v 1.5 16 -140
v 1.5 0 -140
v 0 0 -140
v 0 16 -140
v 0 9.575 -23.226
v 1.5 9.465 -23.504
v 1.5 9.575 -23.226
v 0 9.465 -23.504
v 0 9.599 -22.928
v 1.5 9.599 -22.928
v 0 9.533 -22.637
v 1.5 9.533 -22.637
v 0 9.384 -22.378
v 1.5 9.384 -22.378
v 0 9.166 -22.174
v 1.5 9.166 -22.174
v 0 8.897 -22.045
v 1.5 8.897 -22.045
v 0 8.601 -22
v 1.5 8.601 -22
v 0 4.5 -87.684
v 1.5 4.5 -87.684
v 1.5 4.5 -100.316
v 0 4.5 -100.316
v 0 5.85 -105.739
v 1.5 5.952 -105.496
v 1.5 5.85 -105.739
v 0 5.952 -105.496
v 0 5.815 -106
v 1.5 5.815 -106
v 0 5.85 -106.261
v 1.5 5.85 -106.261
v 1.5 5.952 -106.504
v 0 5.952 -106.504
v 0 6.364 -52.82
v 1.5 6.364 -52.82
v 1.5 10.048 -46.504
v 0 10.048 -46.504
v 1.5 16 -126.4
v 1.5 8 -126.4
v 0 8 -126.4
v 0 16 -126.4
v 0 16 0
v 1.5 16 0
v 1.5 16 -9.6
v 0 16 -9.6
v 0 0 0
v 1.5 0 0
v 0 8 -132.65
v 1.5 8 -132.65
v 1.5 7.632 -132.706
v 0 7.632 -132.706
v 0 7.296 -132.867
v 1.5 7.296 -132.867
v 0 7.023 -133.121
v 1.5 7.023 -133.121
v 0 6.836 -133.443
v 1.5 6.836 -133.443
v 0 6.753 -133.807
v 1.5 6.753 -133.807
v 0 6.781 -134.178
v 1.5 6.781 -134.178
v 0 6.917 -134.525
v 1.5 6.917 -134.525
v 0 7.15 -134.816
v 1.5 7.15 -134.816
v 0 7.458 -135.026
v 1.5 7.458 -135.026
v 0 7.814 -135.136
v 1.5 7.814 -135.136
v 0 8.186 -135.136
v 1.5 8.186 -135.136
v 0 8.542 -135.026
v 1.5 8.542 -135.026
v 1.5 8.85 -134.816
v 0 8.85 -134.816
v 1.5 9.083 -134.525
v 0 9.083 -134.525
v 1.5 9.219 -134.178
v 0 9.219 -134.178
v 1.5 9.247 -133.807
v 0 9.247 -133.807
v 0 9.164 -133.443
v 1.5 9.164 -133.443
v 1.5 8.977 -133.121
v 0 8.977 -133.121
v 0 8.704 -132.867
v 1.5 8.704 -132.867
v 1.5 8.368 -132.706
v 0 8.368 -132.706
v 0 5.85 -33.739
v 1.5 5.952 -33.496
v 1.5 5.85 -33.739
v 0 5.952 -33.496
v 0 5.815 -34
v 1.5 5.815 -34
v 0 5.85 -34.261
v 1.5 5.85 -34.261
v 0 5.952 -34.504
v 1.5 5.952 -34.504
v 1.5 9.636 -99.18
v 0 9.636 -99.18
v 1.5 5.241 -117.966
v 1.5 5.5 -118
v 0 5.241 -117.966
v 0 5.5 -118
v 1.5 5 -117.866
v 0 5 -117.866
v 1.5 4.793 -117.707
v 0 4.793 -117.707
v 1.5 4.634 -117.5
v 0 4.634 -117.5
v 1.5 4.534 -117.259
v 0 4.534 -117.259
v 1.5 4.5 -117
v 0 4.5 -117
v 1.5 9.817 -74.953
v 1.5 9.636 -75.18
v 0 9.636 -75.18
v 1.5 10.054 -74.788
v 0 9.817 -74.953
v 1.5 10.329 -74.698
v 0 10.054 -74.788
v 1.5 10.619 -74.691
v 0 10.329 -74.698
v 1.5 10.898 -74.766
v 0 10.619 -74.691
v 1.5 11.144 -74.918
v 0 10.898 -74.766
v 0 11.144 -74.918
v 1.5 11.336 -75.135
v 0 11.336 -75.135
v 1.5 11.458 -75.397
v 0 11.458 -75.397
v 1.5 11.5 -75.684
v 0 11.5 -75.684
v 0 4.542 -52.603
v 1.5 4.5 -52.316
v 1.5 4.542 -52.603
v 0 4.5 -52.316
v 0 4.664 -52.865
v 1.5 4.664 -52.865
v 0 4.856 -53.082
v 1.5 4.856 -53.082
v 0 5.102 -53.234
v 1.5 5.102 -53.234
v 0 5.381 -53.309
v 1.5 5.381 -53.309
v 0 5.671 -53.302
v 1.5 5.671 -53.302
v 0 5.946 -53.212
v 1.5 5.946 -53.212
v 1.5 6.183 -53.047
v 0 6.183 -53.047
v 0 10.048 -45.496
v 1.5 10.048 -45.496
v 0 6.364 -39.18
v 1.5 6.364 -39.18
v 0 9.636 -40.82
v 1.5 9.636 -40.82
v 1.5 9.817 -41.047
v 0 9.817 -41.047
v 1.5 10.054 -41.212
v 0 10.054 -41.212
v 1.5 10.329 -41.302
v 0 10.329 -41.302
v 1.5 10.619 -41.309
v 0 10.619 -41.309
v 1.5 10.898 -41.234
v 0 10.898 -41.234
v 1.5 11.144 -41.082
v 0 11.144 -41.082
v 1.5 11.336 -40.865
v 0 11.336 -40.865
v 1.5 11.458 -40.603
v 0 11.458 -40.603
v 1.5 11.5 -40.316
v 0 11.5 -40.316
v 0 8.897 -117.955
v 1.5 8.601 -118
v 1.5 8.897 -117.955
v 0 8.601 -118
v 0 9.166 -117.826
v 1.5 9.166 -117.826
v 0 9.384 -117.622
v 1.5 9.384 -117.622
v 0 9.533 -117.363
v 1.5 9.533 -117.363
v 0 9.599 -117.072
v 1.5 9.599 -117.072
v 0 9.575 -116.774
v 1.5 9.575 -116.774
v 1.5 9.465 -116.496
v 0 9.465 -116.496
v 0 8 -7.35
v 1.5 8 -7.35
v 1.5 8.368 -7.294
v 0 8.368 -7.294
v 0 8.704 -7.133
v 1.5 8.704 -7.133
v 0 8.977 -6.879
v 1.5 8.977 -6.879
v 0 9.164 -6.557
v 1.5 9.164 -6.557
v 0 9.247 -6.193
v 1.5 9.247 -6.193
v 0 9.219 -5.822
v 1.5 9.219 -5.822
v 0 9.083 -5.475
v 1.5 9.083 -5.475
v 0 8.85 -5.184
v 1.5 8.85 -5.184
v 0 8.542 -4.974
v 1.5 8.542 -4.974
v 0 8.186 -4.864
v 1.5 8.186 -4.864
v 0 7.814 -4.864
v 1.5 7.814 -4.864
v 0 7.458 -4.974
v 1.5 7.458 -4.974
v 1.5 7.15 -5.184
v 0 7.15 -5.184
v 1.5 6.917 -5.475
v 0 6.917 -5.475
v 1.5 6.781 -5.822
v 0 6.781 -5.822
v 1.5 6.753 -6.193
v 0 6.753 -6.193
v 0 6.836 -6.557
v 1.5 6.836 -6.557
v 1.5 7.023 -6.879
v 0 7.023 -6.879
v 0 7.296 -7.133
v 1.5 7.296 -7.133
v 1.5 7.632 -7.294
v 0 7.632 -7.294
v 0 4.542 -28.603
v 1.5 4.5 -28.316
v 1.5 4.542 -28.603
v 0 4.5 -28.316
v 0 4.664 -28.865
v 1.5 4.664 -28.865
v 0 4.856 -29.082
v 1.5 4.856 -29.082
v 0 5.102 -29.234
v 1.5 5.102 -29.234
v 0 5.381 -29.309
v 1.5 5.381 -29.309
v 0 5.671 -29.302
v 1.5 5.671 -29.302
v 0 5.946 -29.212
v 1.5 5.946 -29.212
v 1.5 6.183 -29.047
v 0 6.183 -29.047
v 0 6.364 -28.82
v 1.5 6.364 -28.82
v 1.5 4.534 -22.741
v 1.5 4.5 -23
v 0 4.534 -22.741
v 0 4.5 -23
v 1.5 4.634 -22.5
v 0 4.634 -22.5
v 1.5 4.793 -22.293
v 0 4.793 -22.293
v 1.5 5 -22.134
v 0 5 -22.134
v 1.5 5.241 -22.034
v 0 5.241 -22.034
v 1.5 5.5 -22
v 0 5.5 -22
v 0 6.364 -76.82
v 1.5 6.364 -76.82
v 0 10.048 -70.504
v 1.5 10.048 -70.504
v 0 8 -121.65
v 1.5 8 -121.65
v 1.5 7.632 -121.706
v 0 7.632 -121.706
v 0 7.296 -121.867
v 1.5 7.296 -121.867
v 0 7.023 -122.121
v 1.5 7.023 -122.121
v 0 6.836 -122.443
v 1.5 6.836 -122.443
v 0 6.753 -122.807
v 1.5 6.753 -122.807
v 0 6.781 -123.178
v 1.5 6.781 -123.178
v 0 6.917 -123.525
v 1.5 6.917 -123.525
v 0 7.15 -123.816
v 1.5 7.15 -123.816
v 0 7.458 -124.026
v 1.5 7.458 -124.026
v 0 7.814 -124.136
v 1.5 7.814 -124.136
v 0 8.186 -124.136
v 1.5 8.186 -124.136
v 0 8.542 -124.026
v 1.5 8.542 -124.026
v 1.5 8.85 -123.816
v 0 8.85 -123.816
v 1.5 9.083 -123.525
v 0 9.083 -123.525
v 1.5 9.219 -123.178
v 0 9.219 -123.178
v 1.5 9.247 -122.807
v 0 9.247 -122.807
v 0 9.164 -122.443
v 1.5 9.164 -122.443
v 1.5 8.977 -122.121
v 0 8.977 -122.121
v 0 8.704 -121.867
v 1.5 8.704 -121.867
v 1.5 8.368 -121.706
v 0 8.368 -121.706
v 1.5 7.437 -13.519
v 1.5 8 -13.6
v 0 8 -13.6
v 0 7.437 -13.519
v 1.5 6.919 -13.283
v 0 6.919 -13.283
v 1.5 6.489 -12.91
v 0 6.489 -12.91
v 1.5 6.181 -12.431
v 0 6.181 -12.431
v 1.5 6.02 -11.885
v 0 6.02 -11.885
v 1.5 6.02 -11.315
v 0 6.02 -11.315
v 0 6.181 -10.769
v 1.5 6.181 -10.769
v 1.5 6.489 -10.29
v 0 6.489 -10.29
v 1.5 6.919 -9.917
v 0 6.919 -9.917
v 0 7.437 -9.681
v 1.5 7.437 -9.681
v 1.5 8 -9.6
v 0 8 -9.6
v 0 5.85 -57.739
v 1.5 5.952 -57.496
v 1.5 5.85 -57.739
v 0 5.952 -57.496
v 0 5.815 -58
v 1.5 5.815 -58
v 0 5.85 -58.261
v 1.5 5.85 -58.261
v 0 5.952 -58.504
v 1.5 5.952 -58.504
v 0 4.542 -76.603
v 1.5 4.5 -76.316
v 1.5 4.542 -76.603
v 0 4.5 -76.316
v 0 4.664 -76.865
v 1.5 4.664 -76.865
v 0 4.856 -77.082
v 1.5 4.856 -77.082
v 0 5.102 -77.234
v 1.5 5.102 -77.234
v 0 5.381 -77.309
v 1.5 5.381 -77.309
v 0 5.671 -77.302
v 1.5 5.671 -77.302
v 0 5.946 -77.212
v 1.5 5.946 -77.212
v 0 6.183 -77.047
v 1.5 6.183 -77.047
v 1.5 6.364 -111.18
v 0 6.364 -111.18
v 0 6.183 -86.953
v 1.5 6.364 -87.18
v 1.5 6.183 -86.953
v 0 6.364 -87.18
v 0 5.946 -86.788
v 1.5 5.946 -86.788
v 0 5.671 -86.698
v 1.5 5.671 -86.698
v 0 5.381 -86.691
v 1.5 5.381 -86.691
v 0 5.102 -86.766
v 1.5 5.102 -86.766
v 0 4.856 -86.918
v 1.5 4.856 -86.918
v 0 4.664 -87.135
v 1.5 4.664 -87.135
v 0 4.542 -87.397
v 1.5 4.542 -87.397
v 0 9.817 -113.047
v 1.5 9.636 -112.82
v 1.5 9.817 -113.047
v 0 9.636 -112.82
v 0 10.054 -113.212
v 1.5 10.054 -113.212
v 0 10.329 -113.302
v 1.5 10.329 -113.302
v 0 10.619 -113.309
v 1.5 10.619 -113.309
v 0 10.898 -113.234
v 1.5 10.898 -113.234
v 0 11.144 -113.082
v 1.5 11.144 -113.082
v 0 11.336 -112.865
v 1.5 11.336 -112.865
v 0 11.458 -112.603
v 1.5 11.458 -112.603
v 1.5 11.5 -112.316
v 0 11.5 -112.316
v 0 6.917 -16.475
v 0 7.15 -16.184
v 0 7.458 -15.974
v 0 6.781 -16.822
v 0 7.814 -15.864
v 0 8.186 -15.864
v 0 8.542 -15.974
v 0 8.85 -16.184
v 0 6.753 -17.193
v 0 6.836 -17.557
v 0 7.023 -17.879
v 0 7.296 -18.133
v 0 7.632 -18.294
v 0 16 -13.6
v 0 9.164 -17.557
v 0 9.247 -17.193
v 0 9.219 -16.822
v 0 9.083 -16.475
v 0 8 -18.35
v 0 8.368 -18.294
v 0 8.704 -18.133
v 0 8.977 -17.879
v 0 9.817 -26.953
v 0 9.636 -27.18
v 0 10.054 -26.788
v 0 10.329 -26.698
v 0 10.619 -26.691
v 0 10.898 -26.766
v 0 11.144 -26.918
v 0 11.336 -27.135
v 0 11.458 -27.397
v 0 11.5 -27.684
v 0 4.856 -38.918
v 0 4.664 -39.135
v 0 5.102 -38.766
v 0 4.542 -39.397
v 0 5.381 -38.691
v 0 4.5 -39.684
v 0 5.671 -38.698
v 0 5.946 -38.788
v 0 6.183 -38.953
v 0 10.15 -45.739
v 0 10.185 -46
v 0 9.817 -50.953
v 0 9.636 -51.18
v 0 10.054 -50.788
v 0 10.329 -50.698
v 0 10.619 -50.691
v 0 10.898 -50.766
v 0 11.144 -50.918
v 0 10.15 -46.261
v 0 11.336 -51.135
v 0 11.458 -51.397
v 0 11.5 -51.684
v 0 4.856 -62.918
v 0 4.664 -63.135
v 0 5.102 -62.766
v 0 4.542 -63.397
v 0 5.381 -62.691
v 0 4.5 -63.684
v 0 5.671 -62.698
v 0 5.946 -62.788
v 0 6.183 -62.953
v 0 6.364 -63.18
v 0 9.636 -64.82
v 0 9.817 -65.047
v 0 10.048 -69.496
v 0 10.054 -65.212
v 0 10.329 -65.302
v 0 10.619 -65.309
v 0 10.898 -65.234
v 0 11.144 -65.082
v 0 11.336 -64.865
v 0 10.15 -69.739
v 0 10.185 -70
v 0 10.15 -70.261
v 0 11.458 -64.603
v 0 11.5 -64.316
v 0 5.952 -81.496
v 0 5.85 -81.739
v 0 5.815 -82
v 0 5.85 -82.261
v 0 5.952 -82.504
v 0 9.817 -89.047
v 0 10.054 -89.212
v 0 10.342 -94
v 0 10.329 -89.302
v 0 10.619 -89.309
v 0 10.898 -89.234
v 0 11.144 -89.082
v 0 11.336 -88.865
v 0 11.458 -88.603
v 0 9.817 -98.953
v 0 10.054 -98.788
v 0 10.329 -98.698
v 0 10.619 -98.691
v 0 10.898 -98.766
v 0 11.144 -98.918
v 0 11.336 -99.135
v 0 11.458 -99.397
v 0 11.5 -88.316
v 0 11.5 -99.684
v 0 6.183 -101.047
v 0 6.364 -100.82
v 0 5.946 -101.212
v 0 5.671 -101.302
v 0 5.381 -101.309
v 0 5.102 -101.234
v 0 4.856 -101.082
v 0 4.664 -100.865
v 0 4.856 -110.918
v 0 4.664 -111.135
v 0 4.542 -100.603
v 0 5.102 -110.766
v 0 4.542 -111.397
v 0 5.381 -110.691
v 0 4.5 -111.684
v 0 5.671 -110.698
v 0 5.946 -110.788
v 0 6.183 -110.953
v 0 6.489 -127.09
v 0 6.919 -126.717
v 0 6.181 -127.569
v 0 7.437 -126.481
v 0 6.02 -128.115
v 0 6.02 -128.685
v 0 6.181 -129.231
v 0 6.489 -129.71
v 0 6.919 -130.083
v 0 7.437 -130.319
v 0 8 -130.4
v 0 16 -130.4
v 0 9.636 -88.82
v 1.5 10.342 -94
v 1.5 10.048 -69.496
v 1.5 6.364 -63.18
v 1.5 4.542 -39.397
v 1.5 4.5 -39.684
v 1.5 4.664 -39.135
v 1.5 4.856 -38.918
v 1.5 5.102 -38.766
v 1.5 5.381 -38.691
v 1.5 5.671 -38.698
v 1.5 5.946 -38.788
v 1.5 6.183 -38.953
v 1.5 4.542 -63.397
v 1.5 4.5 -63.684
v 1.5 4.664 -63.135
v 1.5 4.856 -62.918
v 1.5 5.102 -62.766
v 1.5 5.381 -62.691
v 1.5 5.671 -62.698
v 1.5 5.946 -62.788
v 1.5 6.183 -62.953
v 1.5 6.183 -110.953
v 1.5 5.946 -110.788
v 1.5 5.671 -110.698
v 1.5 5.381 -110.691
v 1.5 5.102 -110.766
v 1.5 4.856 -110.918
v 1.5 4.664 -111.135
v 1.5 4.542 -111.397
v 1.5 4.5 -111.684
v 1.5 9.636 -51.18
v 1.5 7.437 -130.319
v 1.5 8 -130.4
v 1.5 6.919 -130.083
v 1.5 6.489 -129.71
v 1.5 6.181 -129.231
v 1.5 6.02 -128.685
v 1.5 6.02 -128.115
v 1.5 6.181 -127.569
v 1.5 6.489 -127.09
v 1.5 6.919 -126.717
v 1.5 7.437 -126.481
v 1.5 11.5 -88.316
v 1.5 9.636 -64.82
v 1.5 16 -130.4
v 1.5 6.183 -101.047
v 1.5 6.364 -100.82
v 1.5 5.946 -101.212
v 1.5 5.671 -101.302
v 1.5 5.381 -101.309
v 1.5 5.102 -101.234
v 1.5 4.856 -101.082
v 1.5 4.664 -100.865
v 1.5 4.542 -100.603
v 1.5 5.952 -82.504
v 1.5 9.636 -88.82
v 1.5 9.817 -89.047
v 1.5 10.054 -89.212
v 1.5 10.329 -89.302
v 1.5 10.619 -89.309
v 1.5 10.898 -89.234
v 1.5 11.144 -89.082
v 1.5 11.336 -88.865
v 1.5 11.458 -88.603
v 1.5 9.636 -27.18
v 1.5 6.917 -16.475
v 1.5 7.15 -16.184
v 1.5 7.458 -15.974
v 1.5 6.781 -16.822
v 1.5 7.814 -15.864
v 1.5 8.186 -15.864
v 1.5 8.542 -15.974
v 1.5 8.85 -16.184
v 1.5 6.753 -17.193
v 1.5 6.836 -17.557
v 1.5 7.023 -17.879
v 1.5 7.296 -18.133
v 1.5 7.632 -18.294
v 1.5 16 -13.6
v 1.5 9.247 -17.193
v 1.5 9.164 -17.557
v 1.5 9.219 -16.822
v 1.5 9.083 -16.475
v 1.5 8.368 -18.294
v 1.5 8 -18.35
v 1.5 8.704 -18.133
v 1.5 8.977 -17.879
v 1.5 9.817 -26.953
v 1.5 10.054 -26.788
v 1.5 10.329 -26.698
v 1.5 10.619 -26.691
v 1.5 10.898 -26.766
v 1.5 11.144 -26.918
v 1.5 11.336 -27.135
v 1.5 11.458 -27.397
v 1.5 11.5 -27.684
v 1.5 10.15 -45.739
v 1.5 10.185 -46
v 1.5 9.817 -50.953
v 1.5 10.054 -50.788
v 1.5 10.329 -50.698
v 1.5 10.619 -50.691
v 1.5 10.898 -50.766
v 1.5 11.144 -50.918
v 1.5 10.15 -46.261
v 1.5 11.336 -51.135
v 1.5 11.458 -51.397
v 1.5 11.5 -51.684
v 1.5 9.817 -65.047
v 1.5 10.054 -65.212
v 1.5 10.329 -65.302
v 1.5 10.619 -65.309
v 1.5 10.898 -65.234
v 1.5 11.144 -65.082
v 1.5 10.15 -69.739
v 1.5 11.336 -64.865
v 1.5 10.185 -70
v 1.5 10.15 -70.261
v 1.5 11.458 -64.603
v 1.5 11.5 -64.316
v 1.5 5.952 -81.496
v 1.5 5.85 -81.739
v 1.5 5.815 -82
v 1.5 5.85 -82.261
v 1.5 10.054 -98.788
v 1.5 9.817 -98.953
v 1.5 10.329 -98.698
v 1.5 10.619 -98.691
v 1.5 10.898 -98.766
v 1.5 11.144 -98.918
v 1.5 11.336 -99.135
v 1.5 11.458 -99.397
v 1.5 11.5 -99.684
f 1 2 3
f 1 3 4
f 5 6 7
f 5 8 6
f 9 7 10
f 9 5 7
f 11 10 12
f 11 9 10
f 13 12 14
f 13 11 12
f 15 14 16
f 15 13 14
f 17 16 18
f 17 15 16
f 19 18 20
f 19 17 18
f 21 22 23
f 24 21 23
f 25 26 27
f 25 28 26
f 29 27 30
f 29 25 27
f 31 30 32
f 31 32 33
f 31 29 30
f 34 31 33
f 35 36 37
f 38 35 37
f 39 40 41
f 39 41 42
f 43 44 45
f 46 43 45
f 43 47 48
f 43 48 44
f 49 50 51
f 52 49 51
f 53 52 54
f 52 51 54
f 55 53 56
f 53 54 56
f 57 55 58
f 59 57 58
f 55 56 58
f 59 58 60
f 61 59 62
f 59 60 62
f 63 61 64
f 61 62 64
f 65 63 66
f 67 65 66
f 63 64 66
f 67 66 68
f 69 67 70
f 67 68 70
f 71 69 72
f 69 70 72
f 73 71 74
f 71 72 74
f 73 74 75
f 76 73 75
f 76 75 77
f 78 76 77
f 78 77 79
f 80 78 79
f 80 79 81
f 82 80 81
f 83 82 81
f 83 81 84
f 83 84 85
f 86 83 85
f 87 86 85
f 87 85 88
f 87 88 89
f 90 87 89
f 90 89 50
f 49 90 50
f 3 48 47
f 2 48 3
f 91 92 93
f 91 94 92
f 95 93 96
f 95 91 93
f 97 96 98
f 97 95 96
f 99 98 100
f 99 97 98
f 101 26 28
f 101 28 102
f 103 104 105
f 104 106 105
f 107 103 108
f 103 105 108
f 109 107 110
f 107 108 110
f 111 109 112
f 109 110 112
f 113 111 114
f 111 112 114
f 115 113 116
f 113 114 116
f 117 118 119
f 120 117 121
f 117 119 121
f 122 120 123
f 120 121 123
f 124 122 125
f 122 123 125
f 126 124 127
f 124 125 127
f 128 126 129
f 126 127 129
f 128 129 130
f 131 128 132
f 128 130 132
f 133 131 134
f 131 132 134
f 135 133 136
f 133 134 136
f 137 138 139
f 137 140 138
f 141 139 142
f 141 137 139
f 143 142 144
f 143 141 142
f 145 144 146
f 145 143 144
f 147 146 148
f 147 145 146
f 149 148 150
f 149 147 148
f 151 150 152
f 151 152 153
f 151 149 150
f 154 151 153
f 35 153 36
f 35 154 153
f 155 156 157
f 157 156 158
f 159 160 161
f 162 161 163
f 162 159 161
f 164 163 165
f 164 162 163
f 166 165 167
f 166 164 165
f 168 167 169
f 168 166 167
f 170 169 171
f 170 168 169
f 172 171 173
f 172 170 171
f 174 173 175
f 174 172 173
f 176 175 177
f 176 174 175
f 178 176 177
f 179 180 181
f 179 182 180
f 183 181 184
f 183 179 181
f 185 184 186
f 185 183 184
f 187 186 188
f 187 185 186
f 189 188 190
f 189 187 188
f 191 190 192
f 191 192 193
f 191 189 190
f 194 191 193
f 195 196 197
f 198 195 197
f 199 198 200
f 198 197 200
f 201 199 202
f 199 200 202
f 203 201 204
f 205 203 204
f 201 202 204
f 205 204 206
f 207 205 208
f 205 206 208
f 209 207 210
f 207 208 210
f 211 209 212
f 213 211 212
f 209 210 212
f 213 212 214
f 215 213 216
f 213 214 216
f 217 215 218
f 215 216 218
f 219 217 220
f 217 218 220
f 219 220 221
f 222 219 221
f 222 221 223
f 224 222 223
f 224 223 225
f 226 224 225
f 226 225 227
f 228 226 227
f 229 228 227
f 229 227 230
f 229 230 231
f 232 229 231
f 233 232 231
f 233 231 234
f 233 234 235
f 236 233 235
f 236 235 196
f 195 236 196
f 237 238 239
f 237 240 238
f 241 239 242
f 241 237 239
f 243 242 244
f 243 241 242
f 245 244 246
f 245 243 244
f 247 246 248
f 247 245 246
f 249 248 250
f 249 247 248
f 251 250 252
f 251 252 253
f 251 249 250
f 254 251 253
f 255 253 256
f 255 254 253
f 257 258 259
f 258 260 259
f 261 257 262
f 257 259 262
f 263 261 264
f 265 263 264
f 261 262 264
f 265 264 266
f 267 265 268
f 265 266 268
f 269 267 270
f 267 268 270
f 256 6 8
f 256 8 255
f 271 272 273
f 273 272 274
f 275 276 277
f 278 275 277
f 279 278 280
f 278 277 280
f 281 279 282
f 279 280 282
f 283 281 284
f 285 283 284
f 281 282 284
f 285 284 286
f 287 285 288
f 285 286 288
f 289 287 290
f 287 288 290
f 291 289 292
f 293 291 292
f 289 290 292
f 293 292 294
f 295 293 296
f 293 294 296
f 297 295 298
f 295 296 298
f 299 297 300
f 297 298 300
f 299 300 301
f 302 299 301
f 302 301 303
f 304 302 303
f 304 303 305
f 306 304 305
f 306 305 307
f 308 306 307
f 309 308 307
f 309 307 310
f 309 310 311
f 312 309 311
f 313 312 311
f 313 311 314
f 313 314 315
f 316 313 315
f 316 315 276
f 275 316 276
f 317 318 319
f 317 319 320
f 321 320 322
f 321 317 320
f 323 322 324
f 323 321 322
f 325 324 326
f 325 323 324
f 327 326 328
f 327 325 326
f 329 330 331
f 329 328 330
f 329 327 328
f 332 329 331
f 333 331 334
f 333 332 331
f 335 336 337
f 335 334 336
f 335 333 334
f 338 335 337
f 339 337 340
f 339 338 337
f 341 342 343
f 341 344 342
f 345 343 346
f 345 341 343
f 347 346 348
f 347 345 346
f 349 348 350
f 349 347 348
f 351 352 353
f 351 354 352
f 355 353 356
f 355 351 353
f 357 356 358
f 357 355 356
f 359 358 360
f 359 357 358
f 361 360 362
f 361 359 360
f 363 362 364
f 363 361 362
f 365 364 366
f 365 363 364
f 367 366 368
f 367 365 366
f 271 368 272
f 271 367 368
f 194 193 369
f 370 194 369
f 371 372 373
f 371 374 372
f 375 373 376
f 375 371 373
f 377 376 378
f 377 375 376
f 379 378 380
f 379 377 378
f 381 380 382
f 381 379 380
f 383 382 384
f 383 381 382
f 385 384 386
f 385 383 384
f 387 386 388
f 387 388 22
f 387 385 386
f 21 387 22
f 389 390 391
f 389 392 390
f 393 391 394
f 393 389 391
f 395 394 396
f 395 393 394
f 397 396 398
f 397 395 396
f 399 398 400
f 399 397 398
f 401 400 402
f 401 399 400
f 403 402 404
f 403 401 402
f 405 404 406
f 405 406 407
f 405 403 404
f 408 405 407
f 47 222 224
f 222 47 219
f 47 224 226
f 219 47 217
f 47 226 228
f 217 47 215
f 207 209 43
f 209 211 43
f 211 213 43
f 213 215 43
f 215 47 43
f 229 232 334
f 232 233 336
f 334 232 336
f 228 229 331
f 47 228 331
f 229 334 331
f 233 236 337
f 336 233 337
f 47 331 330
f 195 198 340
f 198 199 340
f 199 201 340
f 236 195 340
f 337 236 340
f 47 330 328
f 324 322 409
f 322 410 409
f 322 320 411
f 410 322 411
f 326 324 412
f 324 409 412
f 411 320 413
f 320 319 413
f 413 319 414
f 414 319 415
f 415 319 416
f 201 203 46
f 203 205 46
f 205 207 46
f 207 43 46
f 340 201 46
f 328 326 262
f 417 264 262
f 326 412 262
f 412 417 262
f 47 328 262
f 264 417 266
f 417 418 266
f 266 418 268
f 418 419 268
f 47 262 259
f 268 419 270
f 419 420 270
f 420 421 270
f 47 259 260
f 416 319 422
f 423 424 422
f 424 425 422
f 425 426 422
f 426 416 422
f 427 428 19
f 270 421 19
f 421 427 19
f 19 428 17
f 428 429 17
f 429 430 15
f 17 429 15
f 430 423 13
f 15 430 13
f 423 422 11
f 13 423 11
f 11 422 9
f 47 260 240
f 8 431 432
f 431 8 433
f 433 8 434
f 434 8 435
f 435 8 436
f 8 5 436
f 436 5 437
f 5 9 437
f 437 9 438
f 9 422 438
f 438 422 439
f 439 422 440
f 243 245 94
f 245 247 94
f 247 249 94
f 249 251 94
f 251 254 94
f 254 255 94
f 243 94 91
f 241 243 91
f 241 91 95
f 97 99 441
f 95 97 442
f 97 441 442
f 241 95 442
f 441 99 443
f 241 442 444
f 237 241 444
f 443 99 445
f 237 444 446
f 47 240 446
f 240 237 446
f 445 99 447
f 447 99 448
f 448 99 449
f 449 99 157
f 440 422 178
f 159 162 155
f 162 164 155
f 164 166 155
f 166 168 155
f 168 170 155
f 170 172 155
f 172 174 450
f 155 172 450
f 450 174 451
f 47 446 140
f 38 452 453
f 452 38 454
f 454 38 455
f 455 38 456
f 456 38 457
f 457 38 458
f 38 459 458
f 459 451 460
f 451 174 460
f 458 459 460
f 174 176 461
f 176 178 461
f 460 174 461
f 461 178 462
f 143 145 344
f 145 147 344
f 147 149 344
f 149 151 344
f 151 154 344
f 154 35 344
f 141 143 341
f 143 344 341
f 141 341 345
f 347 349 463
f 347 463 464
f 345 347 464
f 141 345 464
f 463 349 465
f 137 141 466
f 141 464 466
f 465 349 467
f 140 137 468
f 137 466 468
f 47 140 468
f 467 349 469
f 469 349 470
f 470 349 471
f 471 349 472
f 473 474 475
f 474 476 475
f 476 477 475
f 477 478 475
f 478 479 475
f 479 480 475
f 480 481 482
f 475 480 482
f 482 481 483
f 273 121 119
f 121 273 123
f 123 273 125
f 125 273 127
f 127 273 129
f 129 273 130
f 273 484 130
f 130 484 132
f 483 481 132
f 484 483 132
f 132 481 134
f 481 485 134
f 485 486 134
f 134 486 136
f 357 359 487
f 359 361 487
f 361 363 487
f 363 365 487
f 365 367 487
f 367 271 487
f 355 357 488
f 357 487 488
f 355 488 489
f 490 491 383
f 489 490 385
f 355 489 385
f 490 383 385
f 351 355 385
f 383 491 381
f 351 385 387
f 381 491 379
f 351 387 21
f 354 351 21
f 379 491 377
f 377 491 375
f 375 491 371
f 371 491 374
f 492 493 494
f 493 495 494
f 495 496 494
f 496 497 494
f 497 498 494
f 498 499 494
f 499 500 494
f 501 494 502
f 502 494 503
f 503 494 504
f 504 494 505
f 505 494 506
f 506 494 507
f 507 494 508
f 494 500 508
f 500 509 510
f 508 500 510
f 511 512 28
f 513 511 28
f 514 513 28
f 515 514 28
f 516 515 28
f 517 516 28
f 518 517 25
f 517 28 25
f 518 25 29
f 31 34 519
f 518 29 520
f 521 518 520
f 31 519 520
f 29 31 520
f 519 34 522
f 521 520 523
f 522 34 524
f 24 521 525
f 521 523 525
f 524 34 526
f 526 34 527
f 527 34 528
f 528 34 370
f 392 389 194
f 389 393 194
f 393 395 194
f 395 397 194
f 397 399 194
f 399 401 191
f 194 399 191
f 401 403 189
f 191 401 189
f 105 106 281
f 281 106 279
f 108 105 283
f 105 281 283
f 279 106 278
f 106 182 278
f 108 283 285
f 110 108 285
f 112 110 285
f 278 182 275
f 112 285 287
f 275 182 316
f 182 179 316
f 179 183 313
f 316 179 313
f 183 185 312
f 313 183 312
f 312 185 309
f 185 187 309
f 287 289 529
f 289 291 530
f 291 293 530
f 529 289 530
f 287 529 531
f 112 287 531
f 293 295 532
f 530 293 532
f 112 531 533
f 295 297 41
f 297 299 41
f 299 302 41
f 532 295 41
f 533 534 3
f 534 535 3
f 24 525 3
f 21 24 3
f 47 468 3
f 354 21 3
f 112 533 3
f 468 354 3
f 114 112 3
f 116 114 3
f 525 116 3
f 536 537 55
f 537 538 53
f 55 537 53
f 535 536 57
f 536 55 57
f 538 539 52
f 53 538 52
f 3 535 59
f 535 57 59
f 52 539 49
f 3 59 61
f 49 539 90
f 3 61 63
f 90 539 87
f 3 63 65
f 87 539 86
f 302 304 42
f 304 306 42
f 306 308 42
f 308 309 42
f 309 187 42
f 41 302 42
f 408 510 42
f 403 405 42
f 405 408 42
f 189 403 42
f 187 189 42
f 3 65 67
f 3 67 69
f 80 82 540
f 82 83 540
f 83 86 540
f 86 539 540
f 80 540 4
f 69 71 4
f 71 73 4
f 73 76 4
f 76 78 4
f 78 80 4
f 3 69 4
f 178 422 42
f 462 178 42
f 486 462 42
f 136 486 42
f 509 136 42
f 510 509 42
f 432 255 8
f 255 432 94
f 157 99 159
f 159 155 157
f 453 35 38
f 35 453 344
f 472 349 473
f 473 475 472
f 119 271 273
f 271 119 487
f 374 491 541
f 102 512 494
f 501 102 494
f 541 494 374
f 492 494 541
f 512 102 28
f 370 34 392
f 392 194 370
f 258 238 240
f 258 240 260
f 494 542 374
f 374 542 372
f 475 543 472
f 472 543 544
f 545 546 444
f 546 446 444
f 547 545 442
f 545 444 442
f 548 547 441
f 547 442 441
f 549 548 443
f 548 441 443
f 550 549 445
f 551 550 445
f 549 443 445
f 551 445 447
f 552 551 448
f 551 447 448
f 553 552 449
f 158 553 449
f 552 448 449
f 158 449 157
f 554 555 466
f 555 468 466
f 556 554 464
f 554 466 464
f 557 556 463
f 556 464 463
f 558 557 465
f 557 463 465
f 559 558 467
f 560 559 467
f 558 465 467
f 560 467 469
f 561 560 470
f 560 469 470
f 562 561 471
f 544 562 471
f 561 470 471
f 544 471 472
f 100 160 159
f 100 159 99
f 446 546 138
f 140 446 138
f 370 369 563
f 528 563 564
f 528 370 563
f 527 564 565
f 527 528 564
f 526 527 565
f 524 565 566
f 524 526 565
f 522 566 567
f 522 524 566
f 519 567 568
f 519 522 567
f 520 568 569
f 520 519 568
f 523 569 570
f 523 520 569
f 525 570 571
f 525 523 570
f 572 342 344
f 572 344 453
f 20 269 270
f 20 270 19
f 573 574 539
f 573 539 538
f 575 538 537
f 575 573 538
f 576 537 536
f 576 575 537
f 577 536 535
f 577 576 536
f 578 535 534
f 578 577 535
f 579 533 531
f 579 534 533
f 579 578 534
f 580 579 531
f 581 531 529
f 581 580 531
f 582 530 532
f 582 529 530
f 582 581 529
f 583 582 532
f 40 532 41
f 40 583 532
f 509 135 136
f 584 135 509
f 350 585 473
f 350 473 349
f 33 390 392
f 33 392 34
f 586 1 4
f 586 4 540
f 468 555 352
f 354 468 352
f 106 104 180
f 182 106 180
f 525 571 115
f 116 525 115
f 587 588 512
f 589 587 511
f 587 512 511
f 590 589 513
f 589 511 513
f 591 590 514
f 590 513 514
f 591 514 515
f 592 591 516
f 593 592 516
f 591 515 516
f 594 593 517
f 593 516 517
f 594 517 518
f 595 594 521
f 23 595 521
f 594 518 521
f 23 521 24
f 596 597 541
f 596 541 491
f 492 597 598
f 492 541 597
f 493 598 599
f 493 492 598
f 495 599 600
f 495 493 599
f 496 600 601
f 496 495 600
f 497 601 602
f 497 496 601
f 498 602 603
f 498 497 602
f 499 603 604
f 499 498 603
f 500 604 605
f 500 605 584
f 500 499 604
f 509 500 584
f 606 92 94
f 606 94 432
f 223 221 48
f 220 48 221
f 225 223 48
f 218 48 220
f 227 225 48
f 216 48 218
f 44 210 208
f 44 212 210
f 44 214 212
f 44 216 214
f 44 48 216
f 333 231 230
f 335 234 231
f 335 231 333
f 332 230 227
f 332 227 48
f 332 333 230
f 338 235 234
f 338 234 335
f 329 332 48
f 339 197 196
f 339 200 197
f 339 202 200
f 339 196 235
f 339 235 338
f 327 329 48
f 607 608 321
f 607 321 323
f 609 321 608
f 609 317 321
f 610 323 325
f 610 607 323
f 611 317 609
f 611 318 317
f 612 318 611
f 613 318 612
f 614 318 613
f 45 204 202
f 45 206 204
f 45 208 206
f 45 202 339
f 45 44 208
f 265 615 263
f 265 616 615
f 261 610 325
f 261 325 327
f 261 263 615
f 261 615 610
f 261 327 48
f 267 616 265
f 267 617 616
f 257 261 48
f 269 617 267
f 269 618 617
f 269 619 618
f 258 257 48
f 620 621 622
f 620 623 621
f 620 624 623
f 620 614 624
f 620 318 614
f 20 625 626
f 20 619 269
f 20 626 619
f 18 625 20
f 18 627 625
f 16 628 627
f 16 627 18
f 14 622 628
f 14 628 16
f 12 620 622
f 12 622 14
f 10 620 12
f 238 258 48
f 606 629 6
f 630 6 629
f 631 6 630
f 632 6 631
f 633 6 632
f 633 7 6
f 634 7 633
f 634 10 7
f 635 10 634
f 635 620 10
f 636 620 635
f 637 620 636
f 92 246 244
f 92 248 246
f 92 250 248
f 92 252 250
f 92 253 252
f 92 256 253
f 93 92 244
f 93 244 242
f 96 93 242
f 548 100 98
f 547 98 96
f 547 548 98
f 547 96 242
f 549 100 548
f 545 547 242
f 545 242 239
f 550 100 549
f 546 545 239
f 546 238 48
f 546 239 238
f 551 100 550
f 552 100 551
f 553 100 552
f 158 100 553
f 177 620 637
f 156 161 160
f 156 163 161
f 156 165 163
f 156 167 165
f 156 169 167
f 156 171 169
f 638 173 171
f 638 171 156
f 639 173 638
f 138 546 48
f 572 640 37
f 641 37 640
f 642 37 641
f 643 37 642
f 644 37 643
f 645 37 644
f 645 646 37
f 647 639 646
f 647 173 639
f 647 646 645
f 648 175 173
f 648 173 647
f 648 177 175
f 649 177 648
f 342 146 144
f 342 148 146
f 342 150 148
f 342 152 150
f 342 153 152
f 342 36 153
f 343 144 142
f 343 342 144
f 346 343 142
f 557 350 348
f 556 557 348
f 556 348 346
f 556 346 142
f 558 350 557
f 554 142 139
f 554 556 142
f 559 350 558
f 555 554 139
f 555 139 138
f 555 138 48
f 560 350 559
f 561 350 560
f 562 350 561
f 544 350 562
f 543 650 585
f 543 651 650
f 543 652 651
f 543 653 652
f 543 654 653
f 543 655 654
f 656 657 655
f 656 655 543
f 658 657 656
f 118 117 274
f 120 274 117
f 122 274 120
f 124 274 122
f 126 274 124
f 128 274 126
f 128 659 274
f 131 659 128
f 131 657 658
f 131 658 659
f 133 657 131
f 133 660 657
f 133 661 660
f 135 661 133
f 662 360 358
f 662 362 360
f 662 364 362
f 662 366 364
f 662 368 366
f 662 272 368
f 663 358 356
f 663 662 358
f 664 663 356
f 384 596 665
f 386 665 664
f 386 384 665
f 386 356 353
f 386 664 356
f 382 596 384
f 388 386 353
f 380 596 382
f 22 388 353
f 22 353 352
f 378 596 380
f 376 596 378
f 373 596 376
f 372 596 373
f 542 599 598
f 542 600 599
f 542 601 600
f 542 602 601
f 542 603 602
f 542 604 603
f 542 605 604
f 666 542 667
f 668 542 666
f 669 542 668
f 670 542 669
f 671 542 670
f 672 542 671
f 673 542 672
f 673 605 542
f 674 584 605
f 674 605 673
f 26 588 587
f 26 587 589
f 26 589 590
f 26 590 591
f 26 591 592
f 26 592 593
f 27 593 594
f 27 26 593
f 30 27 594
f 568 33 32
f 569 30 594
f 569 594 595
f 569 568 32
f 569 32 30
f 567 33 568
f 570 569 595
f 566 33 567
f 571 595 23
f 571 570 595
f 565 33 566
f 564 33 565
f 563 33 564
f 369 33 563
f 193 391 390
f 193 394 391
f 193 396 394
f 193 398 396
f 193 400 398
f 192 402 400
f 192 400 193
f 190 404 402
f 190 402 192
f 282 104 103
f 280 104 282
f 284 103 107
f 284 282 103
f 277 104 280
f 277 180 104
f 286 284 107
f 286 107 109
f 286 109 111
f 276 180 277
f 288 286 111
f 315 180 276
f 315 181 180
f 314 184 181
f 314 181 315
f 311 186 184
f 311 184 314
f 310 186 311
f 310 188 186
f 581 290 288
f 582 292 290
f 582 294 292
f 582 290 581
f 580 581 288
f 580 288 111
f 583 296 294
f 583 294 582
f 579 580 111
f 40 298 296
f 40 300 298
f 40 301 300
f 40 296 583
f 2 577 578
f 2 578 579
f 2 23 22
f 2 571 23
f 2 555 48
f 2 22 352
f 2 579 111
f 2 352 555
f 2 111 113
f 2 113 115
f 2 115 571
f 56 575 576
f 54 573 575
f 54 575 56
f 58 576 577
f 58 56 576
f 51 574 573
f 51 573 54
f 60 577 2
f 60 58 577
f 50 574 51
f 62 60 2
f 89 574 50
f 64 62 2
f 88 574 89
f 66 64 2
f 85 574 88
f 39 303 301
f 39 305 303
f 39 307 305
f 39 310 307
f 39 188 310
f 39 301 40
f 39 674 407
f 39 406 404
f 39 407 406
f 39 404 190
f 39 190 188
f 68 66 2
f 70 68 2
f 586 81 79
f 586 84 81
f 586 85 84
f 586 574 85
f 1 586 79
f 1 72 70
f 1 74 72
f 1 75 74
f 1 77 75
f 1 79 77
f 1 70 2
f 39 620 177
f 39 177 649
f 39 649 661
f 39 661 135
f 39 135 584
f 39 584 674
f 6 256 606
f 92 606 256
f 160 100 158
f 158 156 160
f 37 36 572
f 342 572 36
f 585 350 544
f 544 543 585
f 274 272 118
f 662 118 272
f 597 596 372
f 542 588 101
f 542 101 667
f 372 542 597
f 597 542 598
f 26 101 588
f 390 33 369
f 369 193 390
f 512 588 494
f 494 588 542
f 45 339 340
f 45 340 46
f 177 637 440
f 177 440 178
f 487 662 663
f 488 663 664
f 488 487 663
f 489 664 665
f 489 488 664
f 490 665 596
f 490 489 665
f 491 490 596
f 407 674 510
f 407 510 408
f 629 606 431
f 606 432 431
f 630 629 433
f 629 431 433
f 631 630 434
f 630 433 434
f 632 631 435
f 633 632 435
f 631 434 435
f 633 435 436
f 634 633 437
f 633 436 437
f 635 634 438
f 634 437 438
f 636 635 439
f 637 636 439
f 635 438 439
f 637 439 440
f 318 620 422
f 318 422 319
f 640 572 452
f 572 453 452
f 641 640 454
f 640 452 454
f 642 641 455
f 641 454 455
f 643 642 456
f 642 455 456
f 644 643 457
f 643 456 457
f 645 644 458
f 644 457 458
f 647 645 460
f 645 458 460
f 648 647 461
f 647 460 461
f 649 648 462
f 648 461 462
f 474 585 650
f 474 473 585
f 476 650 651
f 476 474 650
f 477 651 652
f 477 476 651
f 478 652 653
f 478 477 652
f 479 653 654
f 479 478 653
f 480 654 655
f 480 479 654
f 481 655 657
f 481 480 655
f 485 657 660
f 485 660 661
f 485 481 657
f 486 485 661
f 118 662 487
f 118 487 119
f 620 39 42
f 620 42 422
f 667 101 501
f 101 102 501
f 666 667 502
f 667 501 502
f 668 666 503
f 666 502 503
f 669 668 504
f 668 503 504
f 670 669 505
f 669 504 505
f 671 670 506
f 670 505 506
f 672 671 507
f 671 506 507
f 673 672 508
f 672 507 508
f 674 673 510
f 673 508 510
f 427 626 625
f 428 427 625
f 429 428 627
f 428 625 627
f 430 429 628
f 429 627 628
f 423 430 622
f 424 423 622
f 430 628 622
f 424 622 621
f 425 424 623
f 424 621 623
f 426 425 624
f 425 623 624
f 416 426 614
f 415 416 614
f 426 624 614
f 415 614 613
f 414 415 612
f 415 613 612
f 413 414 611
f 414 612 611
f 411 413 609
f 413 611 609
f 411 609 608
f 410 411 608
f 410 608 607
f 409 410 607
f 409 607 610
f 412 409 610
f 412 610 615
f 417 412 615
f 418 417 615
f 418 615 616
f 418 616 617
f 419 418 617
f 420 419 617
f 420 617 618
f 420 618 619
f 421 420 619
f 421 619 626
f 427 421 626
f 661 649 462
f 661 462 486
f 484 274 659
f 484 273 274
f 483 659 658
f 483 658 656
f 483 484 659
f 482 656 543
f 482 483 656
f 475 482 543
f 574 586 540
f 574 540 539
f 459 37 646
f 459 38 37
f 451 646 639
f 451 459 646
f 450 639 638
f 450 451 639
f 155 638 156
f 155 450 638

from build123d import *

# Parameters (mm, degrees)
SKETCH1_R           = 1.05
BOSS_EXTRUDE1_DEPTH = 1.5
FILLET1_R           = 1.5
SKETCH2_R           = 1.05
SKETCH2_W           = 4
SKETCH2_H           = 16
BOSS_EXTRUDE2_DEPTH = 1.5
SKETCH4_R           = 1.25
CUT_EXTRUDE2_DEPTH  = 160.067595694
CUT_EXTRUDE4_DEPTH  = 160.067595694
FILLET3_R           = 1
FILLET4_R           = 1.5
SKETCH6_W           = 140
SKETCH6_H           = 59.5
CUT_EXTRUDE5_DEPTH  = 10


with BuildPart() as part:
    # Sketch1 → Boss-Extrude1 (new body)
    with BuildSketch(Plane(origin=(0, 0, 0), x_dir=(0, 0, -1), z_dir=(1, 0, 0))):
        Polygon((0, 0), (0, 75.5), (21.5, 75.5), (40, 0), (35.881667859, 0), (29.755840045, 25), (4, 25), (4, 0), align=None)
        with Locations((5.5, 72.5)):
            Circle(SKETCH1_R, mode=Mode.SUBTRACT)
        with Locations((18.5, 72.5)):
            Circle(SKETCH1_R, mode=Mode.SUBTRACT)
        Polygon((4, 69.5), (18.851866535, 69.5), (4, 29), align=None, mode=Mode.SUBTRACT)
        Polygon((8.260475549, 29), (20.558388216, 62.535546651), (28.775707595, 29), align=None, mode=Mode.SUBTRACT)
    extrude(amount=BOSS_EXTRUDE1_DEPTH)

    # Fillet1
    fillet1_edges = [part.edges().sort_by_distance(p)[0] for p in [
        (0.75, 75.5, -21.5),
        (0.75, 25, -29.755840045),
        (0.75, 25, -4),
        (0.75, 69.5, -4),
        (0.75, 29, -4),
        (0.75, 69.5, -18.851866535),
        (0.75, 29, -8.260475549),
        (0.75, 29, -28.775707595),
        (0.75, 62.535546651, -20.558388216),
    ]]
    fillet(fillet1_edges, radius=FILLET1_R)

    # Sketch2 → Boss-Extrude2 (add)
    # profile 1 of 5: a face of its own
    with BuildSketch(Plane(origin=(1.5, 0, 0), x_dir=(0, 0, -1), z_dir=(1, 0, 0))):
        Polygon((70, 0), (70, 16), (36.079470199, 16), (40, 0), align=None)
    # profile 2 of 5: a face of its own
    with BuildSketch(Plane(origin=(1.5, 0, 0), x_dir=(0, 0, -1), z_dir=(1, 0, 0))):
        with BuildLine():
            Line((103.920529801, 16), (70, 16))
            Line((70, 16), (70, 0))
            Line((70, 0), (140, 0))
            Line((140, 0), (140, 16))
            Line((140, 16), (140, 75.5))
            Line((140, 75.5), (119.676824884, 75.5))
            ThreePointArc((119.676824884, 75.5), (118.750942408, 75.180144754), (118.219924421, 74.356988855))
            Line((118.219924421, 74.356988855), (103.920529801, 16))
        make_face()
        with BuildLine():
            Line((108.038861942, 16), (109.964084377, 23.856988855))
            ThreePointArc((109.964084377, 23.856988855), (110.495102363, 24.680144754), (111.420984839, 25))
            Line((111.420984839, 25), (134.5, 25))
            ThreePointArc((134.5, 25), (135.560660172, 24.560660172), (136, 23.5))
            Line((136, 23.5), (136, 16))
            Line((136, 16), (108.038861942, 16))
        make_face(mode=Mode.SUBTRACT)
        with BuildLine():
            ThreePointArc((131.000070484, 31.016439186), (130.821545012, 29.641122471), (129.591776989, 29))
            Line((129.591776989, 29), (113.136216627, 29))
            ThreePointArc((113.136216627, 29), (111.956071873, 29.574117524), (111.679316165, 30.856988855))
            Line((111.679316165, 30.856988855), (118.270545293, 57.756329353))
            ThreePointArc((118.270545293, 57.756329353), (119.644098522, 58.897023121), (121.135739251, 57.915779684))
            Line((121.135739251, 57.915779684), (131.000070484, 31.016439186))
        make_face(mode=Mode.SUBTRACT)
        with BuildLine():
            ThreePointArc((121.887587432, 67.483560814), (122.066112904, 68.858877529), (123.295880927, 69.5))
            Line((123.295880927, 69.5), (134.5, 69.5))
            ThreePointArc((134.5, 69.5), (135.560660172, 69.060660172), (136, 68))
            Line((136, 68), (136, 37.447151885))
            ThreePointArc((136, 37.447151885), (134.762259183, 35.970256452), (133.091706505, 36.930712699))
            Line((133.091706505, 36.930712699), (121.887587432, 67.483560814))
        make_face(mode=Mode.SUBTRACT)
        with Locations((121.5, 72.5)):
            Circle(SKETCH2_R, mode=Mode.SUBTRACT)
        with Locations((134.5, 72.5)):
            Circle(SKETCH2_R, mode=Mode.SUBTRACT)
    # profile 3 of 5: a face of its own
    with BuildSketch(Plane(origin=(1.5, 0, 0), x_dir=(0, 0, -1), z_dir=(1, 0, 0))):
        Polygon((35.881667859, 0), (31.961138058, 16), (4, 16), (4, 0), align=None)
    # profile 4 of 5: a face of its own
    with BuildSketch(Plane(origin=(1.5, 0, 0), x_dir=(0, 0, -1), z_dir=(1, 0, 0))):
        Polygon((40, 0), (36.079470199, 16), (31.961138058, 16), (35.881667859, 0), align=None)
    # profile 5 of 5: a face of its own
    with BuildSketch(Plane(origin=(1.5, 0, 0), x_dir=(0, 0, -1), z_dir=(1, 0, 0))):
        with Locations((2, 8)):
            Rectangle(SKETCH2_W, SKETCH2_H)
    extrude(amount=-BOSS_EXTRUDE2_DEPTH)

    # Sketch4 → Cut-Extrude2 (cut, through all)
    with BuildSketch(Plane(origin=(1.5, 0, 0), x_dir=(0, 0, -1), z_dir=(1, 0, 0))):
        with Locations((6.1, 8)):
            Circle(SKETCH4_R)
        with Locations((17.1, 8)):
            Circle(SKETCH4_R)
        with Locations(Location((122.9, 8, 0), (0, 0, 180))):
            Circle(SKETCH4_R)
        with Locations(Location((133.9, 8, 0), (0, 0, 180))):
            Circle(SKETCH4_R)
        with BuildLine():
            Line((126.4, 16), (130.4, 16))
            Line((130.4, 16), (130.4, 8))
            ThreePointArc((130.4, 8), (128.4, 6), (126.4, 8))
            Line((126.4, 8), (126.4, 16))
        make_face()
        with BuildLine():
            Line((9.6, 16), (13.6, 16))
            Line((13.6, 16), (13.6, 8))
            ThreePointArc((13.6, 8), (11.6, 6), (9.6, 8))
            Line((9.6, 8), (9.6, 16))
        make_face()
    extrude(amount=-CUT_EXTRUDE2_DEPTH, mode=Mode.SUBTRACT)

    # Sketch5 → Cut-Extrude4 (cut, through all)
    with BuildSketch(Plane(origin=(1.5, 0, 0), x_dir=(0, 0, -1), z_dir=(1, 0, 0))):
        Polygon((35.984634856, 4.5), (46, 4.5), (56.015365144, 4.5), (46, 10.342296334), align=None)
        Polygon((47.984634856, 11.5), (68.015365144, 11.5), (58, 5.657703666), align=None)
        Polygon((59.984634856, 4.5), (70, 4.5), (80.015365144, 4.5), (70, 10.342296334), align=None)
        Polygon((22, 4.5), (22, 10.342296334), (32.015365144, 4.5), align=None)
        Polygon((23.984634856, 11.5), (44.015365144, 11.5), (34, 5.657703666), align=None)
        Polygon((118, 4.5), (118, 10.342296334), (107.984634856, 4.5), align=None)
        Polygon((94, 4.5), (104.015365144, 4.5), (94, 10.342296334), (83.984634856, 4.5), align=None)
        Polygon((95.984634856, 11.5), (116.015365144, 11.5), (106, 5.657703666), align=None)
        Polygon((71.984634856, 11.5), (92.015365144, 11.5), (82, 5.657703666), align=None)
    extrude(amount=-CUT_EXTRUDE4_DEPTH, mode=Mode.SUBTRACT)

    # Fillet3
    fillet3_edges = [part.edges().sort_by_distance(p)[0] for p in [
        (0.75, 4.5, -83.984634856),
        (0.75, 4.5, -104.015365144),
        (0.75, 4.5, -80.015365144),
        (0.75, 4.5, -59.984634856),
        (0.75, 10.342296334, -70),
        (0.75, 4.5, -56.015365144),
        (0.75, 4.5, -35.984634856),
        (0.75, 10.342296334, -46),
        (0.75, 4.5, -118),
        (0.75, 4.5, -107.984634856),
        (0.75, 10.342296334, -118),
        (0.75, 11.5, -44.015365144),
        (0.75, 5.657703666, -34),
        (0.75, 11.5, -23.984634856),
        (0.75, 5.657703666, -58),
        (0.75, 11.5, -47.984634856),
        (0.75, 11.5, -68.015365144),
        (0.75, 11.5, -116.015365144),
        (0.75, 5.657703666, -106),
        (0.75, 11.5, -95.984634856),
        (0.75, 11.5, -92.015365144),
        (0.75, 5.657703666, -82),
        (0.75, 11.5, -71.984634856),
        (0.75, 4.5, -32.015365144),
        (0.75, 4.5, -22),
        (0.75, 10.342296334, -22),
    ]]
    fillet(fillet3_edges, radius=FILLET3_R)

    # Fillet4
    fillet4_edges = [part.edges().sort_by_distance(p)[0] for p in [
        (0.75, 16, -4),
        (0.75, 16, -31.961138058),
        (0.75, 16, -36.079470199),
        (0.75, 16, -136),
        (0.75, 16, -108.038861942),
        (0.75, 16, -103.920529801),
    ]]
    fillet(fillet4_edges, radius=FILLET4_R)

    # Sketch6 → Cut-Extrude5 (cut)
    with BuildSketch(Plane(origin=(1.5, 0, 0), x_dir=(0, 0, -1), z_dir=(1, 0, 0))):
        with Locations((70, 45.75)):
            Rectangle(SKETCH6_W, SKETCH6_H)
    extrude(amount=-CUT_EXTRUDE5_DEPTH, mode=Mode.SUBTRACT)


solid = part.part
